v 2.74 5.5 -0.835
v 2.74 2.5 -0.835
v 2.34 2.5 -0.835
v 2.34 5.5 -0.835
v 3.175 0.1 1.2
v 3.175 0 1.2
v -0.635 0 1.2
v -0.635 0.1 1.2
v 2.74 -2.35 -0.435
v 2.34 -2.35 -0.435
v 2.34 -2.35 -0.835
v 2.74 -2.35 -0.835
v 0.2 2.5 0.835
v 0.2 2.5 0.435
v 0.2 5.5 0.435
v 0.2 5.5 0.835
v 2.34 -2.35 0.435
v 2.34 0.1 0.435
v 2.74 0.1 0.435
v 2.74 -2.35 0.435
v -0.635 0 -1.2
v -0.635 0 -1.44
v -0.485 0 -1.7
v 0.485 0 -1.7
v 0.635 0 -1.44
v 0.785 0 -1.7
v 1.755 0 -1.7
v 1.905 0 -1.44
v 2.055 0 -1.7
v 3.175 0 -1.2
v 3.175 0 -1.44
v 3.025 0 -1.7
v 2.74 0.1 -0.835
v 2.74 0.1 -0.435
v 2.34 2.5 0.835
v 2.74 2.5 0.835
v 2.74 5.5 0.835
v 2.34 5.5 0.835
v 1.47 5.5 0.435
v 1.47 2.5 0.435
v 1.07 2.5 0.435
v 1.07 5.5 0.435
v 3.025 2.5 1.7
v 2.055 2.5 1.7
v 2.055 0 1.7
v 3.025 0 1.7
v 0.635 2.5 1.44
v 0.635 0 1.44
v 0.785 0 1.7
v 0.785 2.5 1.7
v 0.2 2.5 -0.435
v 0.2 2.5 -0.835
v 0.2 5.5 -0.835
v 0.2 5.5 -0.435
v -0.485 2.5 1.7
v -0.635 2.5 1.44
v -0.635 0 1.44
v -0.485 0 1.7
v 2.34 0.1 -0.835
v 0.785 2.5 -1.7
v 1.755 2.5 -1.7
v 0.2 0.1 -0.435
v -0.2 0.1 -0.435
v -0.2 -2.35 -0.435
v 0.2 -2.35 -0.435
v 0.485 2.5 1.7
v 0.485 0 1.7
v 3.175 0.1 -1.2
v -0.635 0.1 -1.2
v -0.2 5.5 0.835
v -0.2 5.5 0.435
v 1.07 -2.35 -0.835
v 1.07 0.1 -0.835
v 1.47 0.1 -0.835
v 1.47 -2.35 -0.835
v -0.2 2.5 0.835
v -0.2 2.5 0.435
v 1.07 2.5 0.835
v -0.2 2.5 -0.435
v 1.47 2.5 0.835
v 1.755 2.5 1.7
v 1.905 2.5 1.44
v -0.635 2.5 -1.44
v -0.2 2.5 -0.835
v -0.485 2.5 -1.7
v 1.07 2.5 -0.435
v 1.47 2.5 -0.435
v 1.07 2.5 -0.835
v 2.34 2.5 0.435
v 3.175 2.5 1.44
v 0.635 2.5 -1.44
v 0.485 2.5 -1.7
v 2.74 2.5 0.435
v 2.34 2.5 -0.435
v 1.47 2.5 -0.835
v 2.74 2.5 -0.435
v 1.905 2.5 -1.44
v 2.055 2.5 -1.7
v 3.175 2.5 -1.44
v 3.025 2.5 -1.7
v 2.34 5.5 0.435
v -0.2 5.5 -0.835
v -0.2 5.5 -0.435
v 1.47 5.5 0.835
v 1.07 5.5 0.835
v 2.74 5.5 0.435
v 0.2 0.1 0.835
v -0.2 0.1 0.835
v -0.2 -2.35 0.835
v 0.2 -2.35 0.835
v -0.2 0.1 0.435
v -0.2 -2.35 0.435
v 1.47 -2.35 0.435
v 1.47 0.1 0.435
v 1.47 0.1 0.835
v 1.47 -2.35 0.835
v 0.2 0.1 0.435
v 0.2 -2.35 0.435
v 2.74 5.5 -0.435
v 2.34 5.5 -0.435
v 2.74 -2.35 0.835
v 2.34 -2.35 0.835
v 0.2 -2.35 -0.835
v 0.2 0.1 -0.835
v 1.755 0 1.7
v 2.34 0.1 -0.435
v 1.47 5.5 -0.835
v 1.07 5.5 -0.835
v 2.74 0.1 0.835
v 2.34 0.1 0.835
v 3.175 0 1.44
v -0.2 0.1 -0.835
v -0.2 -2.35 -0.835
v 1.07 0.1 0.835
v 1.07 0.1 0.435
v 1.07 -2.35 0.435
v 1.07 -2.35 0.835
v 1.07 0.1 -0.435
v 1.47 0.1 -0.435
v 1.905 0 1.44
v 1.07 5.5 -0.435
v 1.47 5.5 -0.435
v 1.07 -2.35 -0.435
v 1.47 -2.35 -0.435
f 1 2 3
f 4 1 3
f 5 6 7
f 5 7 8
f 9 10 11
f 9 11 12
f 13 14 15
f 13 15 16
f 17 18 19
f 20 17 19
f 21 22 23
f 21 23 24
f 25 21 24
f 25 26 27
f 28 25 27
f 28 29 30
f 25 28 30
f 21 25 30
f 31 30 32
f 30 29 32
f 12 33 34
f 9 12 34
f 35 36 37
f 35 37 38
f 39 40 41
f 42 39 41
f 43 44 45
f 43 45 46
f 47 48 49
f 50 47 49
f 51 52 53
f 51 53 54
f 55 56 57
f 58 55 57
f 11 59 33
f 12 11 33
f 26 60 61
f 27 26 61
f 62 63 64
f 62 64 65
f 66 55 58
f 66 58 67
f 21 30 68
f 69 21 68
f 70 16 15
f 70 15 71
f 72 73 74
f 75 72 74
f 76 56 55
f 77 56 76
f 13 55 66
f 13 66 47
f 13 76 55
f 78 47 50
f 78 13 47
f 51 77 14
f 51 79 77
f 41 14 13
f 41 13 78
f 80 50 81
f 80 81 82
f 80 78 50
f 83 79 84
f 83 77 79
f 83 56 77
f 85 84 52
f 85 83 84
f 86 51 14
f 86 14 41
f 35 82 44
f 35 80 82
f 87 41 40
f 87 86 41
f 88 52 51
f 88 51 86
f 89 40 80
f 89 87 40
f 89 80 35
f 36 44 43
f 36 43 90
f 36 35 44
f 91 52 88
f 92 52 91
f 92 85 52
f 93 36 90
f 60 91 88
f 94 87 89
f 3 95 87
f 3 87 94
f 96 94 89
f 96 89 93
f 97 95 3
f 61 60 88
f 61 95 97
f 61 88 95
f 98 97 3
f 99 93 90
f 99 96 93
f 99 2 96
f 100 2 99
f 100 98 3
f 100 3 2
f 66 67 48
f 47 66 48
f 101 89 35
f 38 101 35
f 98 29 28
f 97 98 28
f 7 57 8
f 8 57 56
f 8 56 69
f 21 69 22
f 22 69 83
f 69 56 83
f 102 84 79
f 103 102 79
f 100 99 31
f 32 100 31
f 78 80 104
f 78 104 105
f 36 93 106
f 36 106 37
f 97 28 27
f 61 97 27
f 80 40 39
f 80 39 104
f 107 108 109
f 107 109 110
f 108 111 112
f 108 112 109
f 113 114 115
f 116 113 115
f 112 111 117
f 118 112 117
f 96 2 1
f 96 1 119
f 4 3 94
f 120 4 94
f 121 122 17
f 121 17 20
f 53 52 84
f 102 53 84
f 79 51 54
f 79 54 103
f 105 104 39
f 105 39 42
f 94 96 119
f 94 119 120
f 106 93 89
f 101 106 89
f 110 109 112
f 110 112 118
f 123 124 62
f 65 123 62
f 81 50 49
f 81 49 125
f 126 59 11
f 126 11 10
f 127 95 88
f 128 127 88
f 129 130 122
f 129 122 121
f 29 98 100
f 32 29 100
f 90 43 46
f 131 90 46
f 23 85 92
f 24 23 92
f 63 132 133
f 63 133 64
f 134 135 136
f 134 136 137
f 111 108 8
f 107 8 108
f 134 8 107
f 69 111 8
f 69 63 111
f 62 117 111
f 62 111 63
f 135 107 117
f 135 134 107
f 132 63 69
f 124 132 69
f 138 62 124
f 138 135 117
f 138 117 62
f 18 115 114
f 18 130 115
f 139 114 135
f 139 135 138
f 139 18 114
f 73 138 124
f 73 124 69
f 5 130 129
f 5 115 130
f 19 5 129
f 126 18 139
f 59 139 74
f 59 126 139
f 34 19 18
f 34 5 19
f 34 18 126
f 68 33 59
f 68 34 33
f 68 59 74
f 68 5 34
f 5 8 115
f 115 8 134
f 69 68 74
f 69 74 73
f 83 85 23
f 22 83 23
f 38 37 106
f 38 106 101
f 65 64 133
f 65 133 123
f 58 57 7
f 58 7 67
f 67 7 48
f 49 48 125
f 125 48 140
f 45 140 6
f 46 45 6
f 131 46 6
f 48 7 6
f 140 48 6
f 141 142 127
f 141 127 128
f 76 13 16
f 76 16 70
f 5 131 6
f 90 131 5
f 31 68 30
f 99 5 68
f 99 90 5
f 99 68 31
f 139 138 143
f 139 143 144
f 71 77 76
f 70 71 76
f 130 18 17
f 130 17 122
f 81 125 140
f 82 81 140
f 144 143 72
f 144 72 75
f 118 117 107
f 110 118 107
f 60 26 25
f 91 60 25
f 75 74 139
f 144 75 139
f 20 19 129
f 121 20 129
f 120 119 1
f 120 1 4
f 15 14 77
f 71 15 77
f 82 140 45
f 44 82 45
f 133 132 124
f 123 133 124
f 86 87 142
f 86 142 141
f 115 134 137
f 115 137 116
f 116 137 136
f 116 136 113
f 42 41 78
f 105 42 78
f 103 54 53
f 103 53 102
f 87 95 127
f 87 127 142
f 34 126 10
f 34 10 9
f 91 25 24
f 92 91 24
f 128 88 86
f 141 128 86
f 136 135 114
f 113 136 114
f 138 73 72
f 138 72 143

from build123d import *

# Parameters (mm, degrees)
SKETCH1_W             = 3.81
SKETCH1_H             = 3.4
BOSS_EXTRUDE1_DEPTH   = 2.5
CUT_EXTRUDE1_DEPTH    = 2.5
CUT_EXTRUDE2_DEPTH    = 2.5
CUT_EXTRUDE3_DEPTH    = 2.5
SKETCH5_W             = 2.4
SKETCH5_H             = 0.1
CUT_EXTRUDE4_DEPTH    = 4.81
CUT_EXTRUDE5_DEPTH    = 2.5
SKETCH7_W             = 0.4
SKETCH7_H             = 0.4
BOSS_EXTRUDE2_DEPTH   = 2.45
SKETCH8_W             = 0.4
SKETCH8_H             = 0.4
BOSS_EXTRUDE3_DEPTH   = 2.45
SKETCH9_W             = 0.4
SKETCH9_H             = 0.4
BOSS_EXTRUDE4_DEPTH   = 2.45
SKETCH10_W            = 0.4
SKETCH10_H            = 0.4
BOSS_EXTRUDE5_DEPTH   = 2.45
SKETCH11_W            = 0.4
SKETCH11_H            = 0.4
BOSS_EXTRUDE6_DEPTH   = 2.45
SKETCH12_W            = 0.4
SKETCH12_H            = 0.4
BOSS_EXTRUDE7_DEPTH   = 2.45
SKETCH13_W            = 0.4
SKETCH13_H            = 0.4
BOSS_EXTRUDE8_DEPTH   = 3
SKETCH14_W            = 0.4
SKETCH14_H            = 0.4
BOSS_EXTRUDE9_DEPTH   = 3
SKETCH15_W            = 0.4
SKETCH15_H            = 0.4
BOSS_EXTRUDE10_DEPTH  = 3
SKETCH16_W            = 0.4
SKETCH16_H            = 0.4
BOSS_EXTRUDE11_DEPTH  = 3
SKETCH17_W            = 0.4
SKETCH17_H            = 0.4
BOSS_EXTRUDE12_DEPTH  = 3
SKETCH18_W            = 0.4
SKETCH18_H            = 0.4
BOSS_EXTRUDE13_DEPTH  = 3
CHAMFER1_SIZE         = 0.15
CHAMFER1_SIZE2        = 0.26
CHAMFER1_PART_2_SIZE  = 0.15
CHAMFER1_PART_2_SIZE2 = 0.26
CHAMFER2_SIZE         = 0.26
CHAMFER2_SIZE2        = 0.15
CHAMFER2_PART_2_SIZE  = 0.26
CHAMFER2_PART_2_SIZE2 = 0.15


with BuildPart() as part:
    # Sketch1 → Boss-Extrude1 (new body)
    with BuildSketch(Plane(origin=(0, 2.5, 0), x_dir=(1, 0, 0), z_dir=(0, 1, 0))):
        with Locations((1.27, 0)):
            Rectangle(SKETCH1_W, SKETCH1_H)
    extrude(amount=-BOSS_EXTRUDE1_DEPTH)

    # Sketch2 → Cut-Extrude1 (cut)
    with BuildSketch(Plane.XZ):
        Polygon((0.785, 1.7), (0.485, 1.7), (0.635, 1.44), align=None)
    extrude(amount=-CUT_EXTRUDE1_DEPTH, mode=Mode.SUBTRACT)

    # Sketch3 → Cut-Extrude2 (cut)
    with BuildSketch(Plane.XZ):
        Polygon((1.755, -1.7), (2.055, -1.7), (1.905, -1.44), align=None)
    extrude(amount=-CUT_EXTRUDE2_DEPTH, mode=Mode.SUBTRACT)

    # Sketch4 → Cut-Extrude3 (cut)
    with BuildSketch(Plane.XZ):
        Polygon((0.485, -1.7), (0.785, -1.7), (0.635, -1.44), align=None)
    extrude(amount=-CUT_EXTRUDE3_DEPTH, mode=Mode.SUBTRACT)

    # Sketch5 → Cut-Extrude4 (cut, through all)
    with BuildSketch(Plane(origin=(3.175, 0, 0), x_dir=(0, 0, -1), z_dir=(1, 0, 0))):
        with Locations((0, 0.05)):
            Rectangle(SKETCH5_W, SKETCH5_H)
    extrude(amount=-CUT_EXTRUDE4_DEPTH, mode=Mode.SUBTRACT)

    # Sketch6 → Cut-Extrude5 (cut)
    with BuildSketch(Plane.XZ):
        Polygon((2.055, 1.7), (1.755, 1.7), (1.905, 1.44), align=None)
    extrude(amount=-CUT_EXTRUDE5_DEPTH, mode=Mode.SUBTRACT)

    # Sketch7 → Boss-Extrude2 (add)
    with BuildSketch(Plane.XZ.offset(-0.1)):
        with Locations((2.54, 0.635)):
            Rectangle(SKETCH7_W, SKETCH7_H)
    extrude(amount=BOSS_EXTRUDE2_DEPTH)

    # Sketch8 → Boss-Extrude3 (add)
    with BuildSketch(Plane.XZ.offset(-0.1)):
        with Locations((2.54, -0.635)):
            Rectangle(SKETCH8_W, SKETCH8_H)
    extrude(amount=BOSS_EXTRUDE3_DEPTH)

    # Sketch9 → Boss-Extrude4 (add)
    with BuildSketch(Plane.XZ.offset(-0.1)):
        with Locations((1.27, 0.635)):
            Rectangle(SKETCH9_W, SKETCH9_H)
    extrude(amount=BOSS_EXTRUDE4_DEPTH)

    # Sketch10 → Boss-Extrude5 (add)
    with BuildSketch(Plane.XZ.offset(-0.1)):
        with Locations((1.27, -0.635)):
            Rectangle(SKETCH10_W, SKETCH10_H)
    extrude(amount=BOSS_EXTRUDE5_DEPTH)

    # Sketch11 → Boss-Extrude6 (add)
    with BuildSketch(Plane.XZ.offset(-0.1)):
        with Locations((0, 0.635)):
            Rectangle(SKETCH11_W, SKETCH11_H)
    extrude(amount=BOSS_EXTRUDE6_DEPTH)

    # Sketch12 → Boss-Extrude7 (add)
    with BuildSketch(Plane.XZ.offset(-0.1)):
        with Locations((0, -0.635)):
            Rectangle(SKETCH12_W, SKETCH12_H)
    extrude(amount=BOSS_EXTRUDE7_DEPTH)

    # Sketch13 → Boss-Extrude8 (add)
    with BuildSketch(Plane(origin=(0, 2.5, 0), x_dir=(-1, 0, 0), z_dir=(0, 1, 0))):
        with Locations((-2.54, 0.635)):
            Rectangle(SKETCH13_W, SKETCH13_H)
    extrude(amount=BOSS_EXTRUDE8_DEPTH)

    # Sketch14 → Boss-Extrude9 (add)
    with BuildSketch(Plane(origin=(0, 2.5, 0), x_dir=(-1, 0, 0), z_dir=(0, 1, 0))):
        with Locations((-2.54, -0.635)):
            Rectangle(SKETCH14_W, SKETCH14_H)
    extrude(amount=BOSS_EXTRUDE9_DEPTH)

    # Sketch15 → Boss-Extrude10 (add)
    with BuildSketch(Plane(origin=(0, 2.5, 0), x_dir=(-1, 0, 0), z_dir=(0, 1, 0))):
        with Locations((-1.27, 0.635)):
            Rectangle(SKETCH15_W, SKETCH15_H)
    extrude(amount=BOSS_EXTRUDE10_DEPTH)

    # Sketch16 → Boss-Extrude11 (add)
    with BuildSketch(Plane(origin=(0, 2.5, 0), x_dir=(-1, 0, 0), z_dir=(0, 1, 0))):
        with Locations((-1.27, -0.635)):
            Rectangle(SKETCH16_W, SKETCH16_H)
    extrude(amount=BOSS_EXTRUDE11_DEPTH)

    # Sketch17 → Boss-Extrude12 (add)
    with BuildSketch(Plane(origin=(0, 2.5, 0), x_dir=(-1, 0, 0), z_dir=(0, 1, 0))):
        with Locations((0, 0.635)):
            Rectangle(SKETCH17_W, SKETCH17_H)
    extrude(amount=BOSS_EXTRUDE12_DEPTH)

    # Sketch18 → Boss-Extrude13 (add)
    with BuildSketch(Plane(origin=(0, 2.5, 0), x_dir=(-1, 0, 0), z_dir=(0, 1, 0))):
        with Locations((0, -0.635)):
            Rectangle(SKETCH18_W, SKETCH18_H)
    extrude(amount=BOSS_EXTRUDE13_DEPTH)

    # Chamfer1
    chamfer1_edges = [part.edges().sort_by_distance(p)[0] for p in [
        (-0.635, 1.25, 1.7),
    ]]
    chamfer1_side = [part.faces().sort_by_distance(p)[0] for p in [
        (-0.075, 1.25, 1.7),
    ]]
    chamfer(chamfer1_edges, length=CHAMFER1_SIZE, length2=CHAMFER1_SIZE2, reference=chamfer1_side[0])

    # Chamfer1 part 2
    chamfer1_part_2_edges = [part.edges().sort_by_distance(p)[0] for p in [
        (3.175, 1.25, -1.7),
    ]]
    chamfer1_part_2_side = [part.faces().sort_by_distance(p)[0] for p in [
        (2.615, 1.25, -1.7),
    ]]
    chamfer(chamfer1_part_2_edges, length=CHAMFER1_PART_2_SIZE, length2=CHAMFER1_PART_2_SIZE2, reference=chamfer1_part_2_side[0])

    # Chamfer2
    chamfer2_edges = [part.edges().sort_by_distance(p)[0] for p in [
        (-0.635, 1.25, -1.7),
    ]]
    chamfer2_side = [part.faces().sort_by_distance(p)[0] for p in [
        (-0.635, 1.287844941, -0.134099869),
    ]]
    chamfer(chamfer2_edges, length=CHAMFER2_SIZE, length2=CHAMFER2_SIZE2, reference=chamfer2_side[0])

    # Chamfer2 part 2
    chamfer2_part_2_edges = [part.edges().sort_by_distance(p)[0] for p in [
        (3.175, 1.25, 1.7),
    ]]
    chamfer2_part_2_side = [part.faces().sort_by_distance(p)[0] for p in [
        (3.175, 1.287844941, 0.134099869),
    ]]
    chamfer(chamfer2_part_2_edges, length=CHAMFER2_PART_2_SIZE, length2=CHAMFER2_PART_2_SIZE2, reference=chamfer2_part_2_side[0])


solid = part.part
